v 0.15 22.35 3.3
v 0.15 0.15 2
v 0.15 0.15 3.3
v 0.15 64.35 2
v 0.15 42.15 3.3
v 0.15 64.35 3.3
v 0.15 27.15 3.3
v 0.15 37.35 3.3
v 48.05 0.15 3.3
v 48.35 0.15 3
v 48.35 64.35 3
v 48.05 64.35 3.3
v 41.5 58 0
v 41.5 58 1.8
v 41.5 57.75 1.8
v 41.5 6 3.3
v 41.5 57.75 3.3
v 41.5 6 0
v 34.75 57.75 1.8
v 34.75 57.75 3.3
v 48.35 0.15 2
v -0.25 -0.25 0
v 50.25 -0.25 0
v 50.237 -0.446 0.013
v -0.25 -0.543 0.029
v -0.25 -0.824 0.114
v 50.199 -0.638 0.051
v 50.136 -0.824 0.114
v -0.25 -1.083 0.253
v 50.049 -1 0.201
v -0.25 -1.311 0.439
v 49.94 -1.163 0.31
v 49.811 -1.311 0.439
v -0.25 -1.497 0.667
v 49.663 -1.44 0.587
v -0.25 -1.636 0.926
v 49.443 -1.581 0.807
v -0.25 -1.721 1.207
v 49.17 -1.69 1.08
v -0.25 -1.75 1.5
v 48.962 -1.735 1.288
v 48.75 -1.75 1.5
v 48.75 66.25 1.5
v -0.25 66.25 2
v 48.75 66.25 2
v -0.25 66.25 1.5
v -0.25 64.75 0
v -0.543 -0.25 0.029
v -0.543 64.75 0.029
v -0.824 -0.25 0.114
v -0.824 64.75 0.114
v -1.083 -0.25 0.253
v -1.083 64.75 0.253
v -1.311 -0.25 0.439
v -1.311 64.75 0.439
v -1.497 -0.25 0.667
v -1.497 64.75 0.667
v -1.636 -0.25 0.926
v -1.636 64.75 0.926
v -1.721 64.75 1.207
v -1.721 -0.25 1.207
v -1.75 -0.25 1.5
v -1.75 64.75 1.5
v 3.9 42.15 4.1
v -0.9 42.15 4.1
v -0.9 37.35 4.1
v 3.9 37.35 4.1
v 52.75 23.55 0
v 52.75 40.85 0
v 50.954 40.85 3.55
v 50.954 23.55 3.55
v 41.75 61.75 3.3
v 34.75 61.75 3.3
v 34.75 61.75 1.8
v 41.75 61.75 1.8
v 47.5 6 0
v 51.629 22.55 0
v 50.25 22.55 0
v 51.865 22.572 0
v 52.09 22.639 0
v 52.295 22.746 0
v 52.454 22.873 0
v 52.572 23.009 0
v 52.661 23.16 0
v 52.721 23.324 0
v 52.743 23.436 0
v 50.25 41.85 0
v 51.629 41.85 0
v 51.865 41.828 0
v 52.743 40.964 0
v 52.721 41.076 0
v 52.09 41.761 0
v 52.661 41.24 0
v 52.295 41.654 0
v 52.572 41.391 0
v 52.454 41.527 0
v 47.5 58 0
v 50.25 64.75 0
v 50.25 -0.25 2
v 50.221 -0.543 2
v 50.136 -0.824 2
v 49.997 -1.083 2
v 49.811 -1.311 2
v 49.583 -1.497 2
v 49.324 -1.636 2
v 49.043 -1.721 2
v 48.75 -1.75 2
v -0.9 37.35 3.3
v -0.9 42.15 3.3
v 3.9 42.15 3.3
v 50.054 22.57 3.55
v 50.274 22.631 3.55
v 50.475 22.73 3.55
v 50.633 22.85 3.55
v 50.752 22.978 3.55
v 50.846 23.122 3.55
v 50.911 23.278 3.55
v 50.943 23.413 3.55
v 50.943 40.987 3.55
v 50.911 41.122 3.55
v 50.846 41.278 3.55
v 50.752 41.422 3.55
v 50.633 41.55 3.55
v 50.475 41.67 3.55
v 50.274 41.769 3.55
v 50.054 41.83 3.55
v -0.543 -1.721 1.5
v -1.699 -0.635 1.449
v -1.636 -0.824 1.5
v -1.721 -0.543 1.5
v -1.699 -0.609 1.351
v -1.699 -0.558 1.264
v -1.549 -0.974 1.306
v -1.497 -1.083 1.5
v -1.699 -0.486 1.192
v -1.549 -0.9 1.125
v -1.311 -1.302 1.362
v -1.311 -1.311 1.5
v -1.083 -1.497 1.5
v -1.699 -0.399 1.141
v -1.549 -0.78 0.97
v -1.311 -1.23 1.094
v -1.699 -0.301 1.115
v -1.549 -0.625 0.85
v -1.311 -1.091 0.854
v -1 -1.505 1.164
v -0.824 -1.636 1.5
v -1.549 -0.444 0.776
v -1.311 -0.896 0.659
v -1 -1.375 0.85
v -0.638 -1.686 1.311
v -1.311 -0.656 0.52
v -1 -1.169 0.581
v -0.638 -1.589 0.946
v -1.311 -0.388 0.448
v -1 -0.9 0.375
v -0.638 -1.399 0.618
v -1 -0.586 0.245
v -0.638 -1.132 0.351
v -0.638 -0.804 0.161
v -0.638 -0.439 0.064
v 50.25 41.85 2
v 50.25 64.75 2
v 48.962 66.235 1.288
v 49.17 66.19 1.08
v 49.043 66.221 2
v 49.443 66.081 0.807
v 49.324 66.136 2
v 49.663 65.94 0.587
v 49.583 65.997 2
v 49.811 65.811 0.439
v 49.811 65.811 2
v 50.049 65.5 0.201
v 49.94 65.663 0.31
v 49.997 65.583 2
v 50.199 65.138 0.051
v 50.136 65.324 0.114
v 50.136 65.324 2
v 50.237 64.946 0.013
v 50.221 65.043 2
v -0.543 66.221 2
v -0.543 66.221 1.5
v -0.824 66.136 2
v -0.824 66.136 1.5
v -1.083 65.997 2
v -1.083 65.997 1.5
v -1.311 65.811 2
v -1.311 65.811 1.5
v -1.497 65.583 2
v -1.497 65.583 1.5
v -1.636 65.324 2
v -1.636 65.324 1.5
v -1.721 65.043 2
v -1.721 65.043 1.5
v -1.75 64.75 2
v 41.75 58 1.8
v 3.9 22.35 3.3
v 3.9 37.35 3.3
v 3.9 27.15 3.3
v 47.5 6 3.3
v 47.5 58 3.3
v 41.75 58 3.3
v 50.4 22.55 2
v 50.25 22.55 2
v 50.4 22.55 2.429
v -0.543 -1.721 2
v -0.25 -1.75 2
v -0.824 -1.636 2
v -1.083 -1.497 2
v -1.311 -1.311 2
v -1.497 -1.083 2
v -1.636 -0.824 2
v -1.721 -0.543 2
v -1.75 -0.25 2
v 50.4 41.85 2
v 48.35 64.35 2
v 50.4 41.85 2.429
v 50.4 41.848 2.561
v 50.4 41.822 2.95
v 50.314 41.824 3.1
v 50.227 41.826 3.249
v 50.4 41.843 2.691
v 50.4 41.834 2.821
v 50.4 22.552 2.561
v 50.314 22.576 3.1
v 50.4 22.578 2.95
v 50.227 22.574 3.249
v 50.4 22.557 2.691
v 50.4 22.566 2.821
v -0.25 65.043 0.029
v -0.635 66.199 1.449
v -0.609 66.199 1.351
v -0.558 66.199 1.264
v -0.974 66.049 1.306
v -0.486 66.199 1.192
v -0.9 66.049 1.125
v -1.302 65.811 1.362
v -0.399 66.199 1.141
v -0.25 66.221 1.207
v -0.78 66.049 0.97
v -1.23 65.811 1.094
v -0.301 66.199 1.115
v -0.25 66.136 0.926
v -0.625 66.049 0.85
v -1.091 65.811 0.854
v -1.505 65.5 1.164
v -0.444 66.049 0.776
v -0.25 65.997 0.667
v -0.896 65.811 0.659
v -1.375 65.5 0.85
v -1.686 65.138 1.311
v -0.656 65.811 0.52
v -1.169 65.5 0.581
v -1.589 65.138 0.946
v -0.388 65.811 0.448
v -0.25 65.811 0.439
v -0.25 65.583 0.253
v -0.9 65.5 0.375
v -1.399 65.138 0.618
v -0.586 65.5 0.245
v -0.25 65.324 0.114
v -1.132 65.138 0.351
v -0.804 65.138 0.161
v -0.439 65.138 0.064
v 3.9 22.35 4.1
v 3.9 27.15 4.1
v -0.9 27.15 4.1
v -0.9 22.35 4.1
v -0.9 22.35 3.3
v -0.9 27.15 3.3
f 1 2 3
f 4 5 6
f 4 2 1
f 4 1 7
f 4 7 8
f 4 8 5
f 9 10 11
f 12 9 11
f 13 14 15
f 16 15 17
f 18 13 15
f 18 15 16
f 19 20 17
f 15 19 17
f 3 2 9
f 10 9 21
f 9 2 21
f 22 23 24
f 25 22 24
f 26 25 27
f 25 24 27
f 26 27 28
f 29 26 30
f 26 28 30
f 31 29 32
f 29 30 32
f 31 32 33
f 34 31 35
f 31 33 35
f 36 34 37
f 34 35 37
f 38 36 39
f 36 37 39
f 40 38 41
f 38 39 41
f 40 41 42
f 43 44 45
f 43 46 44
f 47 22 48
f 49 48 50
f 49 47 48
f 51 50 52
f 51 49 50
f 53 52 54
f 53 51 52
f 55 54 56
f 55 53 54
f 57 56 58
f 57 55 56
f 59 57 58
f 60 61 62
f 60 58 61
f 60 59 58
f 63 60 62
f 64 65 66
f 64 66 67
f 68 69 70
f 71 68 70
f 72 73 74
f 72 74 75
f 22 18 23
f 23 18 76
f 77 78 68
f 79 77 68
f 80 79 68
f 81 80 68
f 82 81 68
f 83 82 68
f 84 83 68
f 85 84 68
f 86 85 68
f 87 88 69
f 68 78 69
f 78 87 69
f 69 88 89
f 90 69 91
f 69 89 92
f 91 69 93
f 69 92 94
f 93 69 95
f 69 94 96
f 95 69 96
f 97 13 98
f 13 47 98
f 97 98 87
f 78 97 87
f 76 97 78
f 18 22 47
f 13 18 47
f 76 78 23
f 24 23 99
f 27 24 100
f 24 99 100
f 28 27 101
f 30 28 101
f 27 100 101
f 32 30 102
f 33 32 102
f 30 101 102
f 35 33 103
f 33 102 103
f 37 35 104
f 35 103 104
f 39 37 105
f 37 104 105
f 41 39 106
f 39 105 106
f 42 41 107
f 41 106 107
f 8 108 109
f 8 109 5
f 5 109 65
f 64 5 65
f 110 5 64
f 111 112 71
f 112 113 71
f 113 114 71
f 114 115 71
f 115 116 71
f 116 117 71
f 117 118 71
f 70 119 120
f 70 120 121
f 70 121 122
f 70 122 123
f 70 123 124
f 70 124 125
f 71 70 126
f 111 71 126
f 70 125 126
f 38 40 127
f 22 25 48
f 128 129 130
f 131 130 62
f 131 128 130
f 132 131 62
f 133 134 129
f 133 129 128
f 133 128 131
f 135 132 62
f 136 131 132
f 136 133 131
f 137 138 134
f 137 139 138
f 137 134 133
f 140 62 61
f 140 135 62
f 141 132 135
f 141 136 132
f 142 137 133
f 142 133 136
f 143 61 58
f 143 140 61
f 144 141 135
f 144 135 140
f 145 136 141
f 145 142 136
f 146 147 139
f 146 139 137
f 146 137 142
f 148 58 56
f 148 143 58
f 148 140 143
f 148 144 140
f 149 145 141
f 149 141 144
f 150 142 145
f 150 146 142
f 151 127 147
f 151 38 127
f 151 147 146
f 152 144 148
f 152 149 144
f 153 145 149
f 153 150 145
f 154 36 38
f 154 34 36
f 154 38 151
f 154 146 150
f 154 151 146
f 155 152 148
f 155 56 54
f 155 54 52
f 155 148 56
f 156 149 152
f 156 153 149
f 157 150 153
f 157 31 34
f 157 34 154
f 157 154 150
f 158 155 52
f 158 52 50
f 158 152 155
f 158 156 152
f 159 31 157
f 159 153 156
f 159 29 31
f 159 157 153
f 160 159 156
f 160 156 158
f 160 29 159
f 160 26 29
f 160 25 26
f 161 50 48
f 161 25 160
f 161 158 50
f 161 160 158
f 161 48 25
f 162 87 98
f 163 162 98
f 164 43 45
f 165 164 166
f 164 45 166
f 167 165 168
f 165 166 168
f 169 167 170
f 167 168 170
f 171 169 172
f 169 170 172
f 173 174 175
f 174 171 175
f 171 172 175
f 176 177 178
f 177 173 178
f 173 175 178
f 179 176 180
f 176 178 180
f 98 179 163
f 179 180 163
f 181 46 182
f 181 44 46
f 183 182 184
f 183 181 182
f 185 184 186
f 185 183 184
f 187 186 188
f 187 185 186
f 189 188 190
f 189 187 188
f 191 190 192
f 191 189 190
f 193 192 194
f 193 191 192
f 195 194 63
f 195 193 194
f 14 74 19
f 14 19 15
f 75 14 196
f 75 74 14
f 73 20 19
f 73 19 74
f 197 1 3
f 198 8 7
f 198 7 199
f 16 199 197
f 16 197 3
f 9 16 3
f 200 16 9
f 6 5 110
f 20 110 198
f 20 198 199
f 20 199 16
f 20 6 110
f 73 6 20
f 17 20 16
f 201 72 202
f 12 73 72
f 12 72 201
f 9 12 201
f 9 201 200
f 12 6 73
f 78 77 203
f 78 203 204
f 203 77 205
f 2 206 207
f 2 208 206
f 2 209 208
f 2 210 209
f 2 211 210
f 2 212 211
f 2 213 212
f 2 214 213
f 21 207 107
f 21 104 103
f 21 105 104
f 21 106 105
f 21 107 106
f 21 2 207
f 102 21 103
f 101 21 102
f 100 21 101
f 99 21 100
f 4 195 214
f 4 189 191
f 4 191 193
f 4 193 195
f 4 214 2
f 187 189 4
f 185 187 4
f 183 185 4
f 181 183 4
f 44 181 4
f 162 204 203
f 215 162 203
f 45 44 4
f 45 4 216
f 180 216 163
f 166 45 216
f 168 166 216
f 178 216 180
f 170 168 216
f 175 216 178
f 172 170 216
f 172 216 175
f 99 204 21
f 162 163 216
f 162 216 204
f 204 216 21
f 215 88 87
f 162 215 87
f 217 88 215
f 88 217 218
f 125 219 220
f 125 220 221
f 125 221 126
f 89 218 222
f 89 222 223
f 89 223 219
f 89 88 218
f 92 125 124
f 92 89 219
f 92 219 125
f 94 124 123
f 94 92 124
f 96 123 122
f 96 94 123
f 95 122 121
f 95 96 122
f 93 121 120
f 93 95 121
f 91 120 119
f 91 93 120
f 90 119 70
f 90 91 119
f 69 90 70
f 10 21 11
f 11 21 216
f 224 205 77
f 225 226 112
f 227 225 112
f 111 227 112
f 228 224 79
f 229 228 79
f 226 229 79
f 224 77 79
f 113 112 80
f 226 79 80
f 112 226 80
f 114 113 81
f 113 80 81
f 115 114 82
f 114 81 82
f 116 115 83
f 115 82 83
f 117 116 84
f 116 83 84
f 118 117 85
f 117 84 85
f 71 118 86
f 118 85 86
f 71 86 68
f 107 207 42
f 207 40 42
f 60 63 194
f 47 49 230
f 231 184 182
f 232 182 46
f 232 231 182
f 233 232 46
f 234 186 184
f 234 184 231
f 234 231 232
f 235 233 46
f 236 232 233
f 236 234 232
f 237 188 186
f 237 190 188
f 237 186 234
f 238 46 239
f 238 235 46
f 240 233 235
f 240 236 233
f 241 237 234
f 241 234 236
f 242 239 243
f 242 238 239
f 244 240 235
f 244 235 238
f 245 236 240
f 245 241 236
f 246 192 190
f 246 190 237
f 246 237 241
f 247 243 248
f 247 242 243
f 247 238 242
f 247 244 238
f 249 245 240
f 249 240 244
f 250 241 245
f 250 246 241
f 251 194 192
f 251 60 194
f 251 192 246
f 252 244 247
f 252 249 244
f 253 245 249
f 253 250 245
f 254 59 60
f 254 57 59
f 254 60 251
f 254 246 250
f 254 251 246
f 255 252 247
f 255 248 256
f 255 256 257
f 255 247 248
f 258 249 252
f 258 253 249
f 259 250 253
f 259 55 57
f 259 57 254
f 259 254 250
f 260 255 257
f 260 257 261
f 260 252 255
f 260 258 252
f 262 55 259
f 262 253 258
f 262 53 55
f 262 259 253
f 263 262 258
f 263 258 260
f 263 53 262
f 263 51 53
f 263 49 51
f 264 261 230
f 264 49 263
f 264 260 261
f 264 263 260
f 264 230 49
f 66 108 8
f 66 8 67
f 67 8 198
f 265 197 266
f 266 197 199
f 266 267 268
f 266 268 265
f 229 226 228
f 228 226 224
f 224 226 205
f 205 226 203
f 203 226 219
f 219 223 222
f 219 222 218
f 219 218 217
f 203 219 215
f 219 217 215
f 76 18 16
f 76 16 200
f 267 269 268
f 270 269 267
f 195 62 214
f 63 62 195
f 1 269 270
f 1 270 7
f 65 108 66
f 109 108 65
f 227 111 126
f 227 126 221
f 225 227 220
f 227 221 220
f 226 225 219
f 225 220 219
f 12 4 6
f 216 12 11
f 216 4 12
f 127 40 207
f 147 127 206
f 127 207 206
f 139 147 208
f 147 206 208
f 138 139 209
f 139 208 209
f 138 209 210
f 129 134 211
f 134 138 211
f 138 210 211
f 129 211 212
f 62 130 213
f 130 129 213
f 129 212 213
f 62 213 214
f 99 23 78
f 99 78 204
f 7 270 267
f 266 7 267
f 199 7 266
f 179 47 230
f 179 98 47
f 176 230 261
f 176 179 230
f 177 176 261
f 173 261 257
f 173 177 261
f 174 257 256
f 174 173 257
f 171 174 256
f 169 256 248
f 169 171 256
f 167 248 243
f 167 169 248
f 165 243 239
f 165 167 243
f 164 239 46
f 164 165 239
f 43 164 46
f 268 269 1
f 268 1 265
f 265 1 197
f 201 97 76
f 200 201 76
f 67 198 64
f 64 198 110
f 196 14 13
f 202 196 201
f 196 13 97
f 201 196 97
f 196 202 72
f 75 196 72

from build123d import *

# Parameters (mm, degrees)
SKETCH_W        = 52
SKETCH_H        = 68
PAD_DEPTH       = 2
SKETCH001_W     = 48.2
SKETCH001_H     = 64.2
PAD001_DEPTH    = 1.3
SKETCH002_W     = 4.8
SKETCH002_H     = 4.8
PAD002_DEPTH    = 0.8
PAD003_DEPTH    = 64.3
SKETCH004_W     = 6
SKETCH004_H     = 52
POCKET_DEPTH    = 5
SKETCH005_W     = 7
SKETCH005_H     = 4
POCKET001_DEPTH = 1.5
POCKET002_DEPTH = 22.5
POCKET003_DEPTH = 22.5
FILLET_R        = 1.5
CHAMFER_SIZE    = 0.3
FILLET001_R     = 1


with BuildPart() as part:
    # Sketch → Pad (new body)
    with BuildSketch(Plane.XY):
        with Locations((24.25, 32.25)):
            Rectangle(SKETCH_W, SKETCH_H)
    extrude(amount=PAD_DEPTH)

    # Sketch001 (on Face6 of Pad) → Pad001 (join)
    with BuildSketch(Plane.XY.offset(2)):
        with Locations((24.25, 32.25)):
            Rectangle(SKETCH001_W, SKETCH001_H)
    extrude(amount=PAD001_DEPTH)

    # Sketch002 (on Face11 of Pad001) → Pad002 (join)
    with BuildSketch(Plane.XY.offset(3.3)):
        with Locations((1.5, 24.75)):
            Rectangle(SKETCH002_W, SKETCH002_H)
        with Locations((1.5, 39.75)):
            Rectangle(SKETCH002_W, SKETCH002_H)
    extrude(amount=PAD002_DEPTH)

    # Sketch003 (on Face9 of Pad002) → Pad003 (join)
    with BuildSketch(Plane(origin=(0, 64.35, 0), x_dir=(-1, 0, 0), z_dir=(0, 1, 0))):
        Polygon((-50.25, 0), (-52.75, 0), (-50.95359, 3.55), (-50.05359, 3.55), (-50.4, 2.95), (-50.4, 2), (-50.25, 2), align=None)
    extrude(amount=-PAD003_DEPTH)

    # Sketch004 (on Face4 of Pad003) → Pocket (cut)
    with BuildSketch(Plane(origin=(0, 0, 0), x_dir=(1, 0, 0), z_dir=(0, 0, -1))):
        with Locations((44.5, -32)):
            Rectangle(SKETCH004_W, SKETCH004_H)
    extrude(amount=-POCKET_DEPTH, mode=Mode.SUBTRACT)

    # Sketch005 (on Face24 of Pocket) → Pocket001 (cut)
    with BuildSketch(Plane.XY.offset(3.3)):
        with Locations((38.25, 59.75)):
            Rectangle(SKETCH005_W, SKETCH005_H)
    extrude(amount=-POCKET001_DEPTH, mode=Mode.SUBTRACT)

    # Sketch006 (on Face6 of Pad003) → Pocket002 (cut)
    with BuildSketch(Plane(origin=(0, 64.35, 0), x_dir=(-1, 0, 0), z_dir=(0, 1, 0))):
        Polygon((-50.25, 0), (-50.25, 3), (-49.75, 3), (-49.75, 4.5), (-53.25, 4.5), (-53.25, 0), align=None)
    extrude(amount=-POCKET002_DEPTH, mode=Mode.SUBTRACT)

    # Sketch007 (on Face21 of Pocket002) → Pocket003 (cut)
    with BuildSketch(Plane.XZ.offset(-0.05)):
        Polygon((50.25, 0), (50.25, 3), (49.75, 3), (49.75, 4.5), (53.25, 4.5), (53.25, 0), align=None)
    extrude(amount=-POCKET003_DEPTH, mode=Mode.SUBTRACT)

    # Fillet
    fillet_edges = [part.edges().sort_by_distance(p)[0] for p in [
        (50.25, -1.75, 1),
        (24.25, -1.75, 0),
        (-1.75, -1.75, 1),
        (-1.75, 32.25, 0),
        (-1.75, 66.25, 1),
        (24.25, 66.25, 0),
        (50.25, 66.25, 1),
    ]]
    fillet(fillet_edges, radius=FILLET_R)

    # Chamfer
    chamfer_edges = [part.edges().sort_by_distance(p)[0] for p in [
        (48.35, 32.25, 3.3),
    ]]
    chamfer(chamfer_edges, length=CHAMFER_SIZE)

    # Fillet001
    fillet001_edges = [part.edges().sort_by_distance(p)[0] for p in [
        (51.851795, 41.85, 1.775),
        (51.851795, 22.55, 1.775),
    ]]
    fillet(fillet001_edges, radius=FILLET001_R)


solid = part.part
